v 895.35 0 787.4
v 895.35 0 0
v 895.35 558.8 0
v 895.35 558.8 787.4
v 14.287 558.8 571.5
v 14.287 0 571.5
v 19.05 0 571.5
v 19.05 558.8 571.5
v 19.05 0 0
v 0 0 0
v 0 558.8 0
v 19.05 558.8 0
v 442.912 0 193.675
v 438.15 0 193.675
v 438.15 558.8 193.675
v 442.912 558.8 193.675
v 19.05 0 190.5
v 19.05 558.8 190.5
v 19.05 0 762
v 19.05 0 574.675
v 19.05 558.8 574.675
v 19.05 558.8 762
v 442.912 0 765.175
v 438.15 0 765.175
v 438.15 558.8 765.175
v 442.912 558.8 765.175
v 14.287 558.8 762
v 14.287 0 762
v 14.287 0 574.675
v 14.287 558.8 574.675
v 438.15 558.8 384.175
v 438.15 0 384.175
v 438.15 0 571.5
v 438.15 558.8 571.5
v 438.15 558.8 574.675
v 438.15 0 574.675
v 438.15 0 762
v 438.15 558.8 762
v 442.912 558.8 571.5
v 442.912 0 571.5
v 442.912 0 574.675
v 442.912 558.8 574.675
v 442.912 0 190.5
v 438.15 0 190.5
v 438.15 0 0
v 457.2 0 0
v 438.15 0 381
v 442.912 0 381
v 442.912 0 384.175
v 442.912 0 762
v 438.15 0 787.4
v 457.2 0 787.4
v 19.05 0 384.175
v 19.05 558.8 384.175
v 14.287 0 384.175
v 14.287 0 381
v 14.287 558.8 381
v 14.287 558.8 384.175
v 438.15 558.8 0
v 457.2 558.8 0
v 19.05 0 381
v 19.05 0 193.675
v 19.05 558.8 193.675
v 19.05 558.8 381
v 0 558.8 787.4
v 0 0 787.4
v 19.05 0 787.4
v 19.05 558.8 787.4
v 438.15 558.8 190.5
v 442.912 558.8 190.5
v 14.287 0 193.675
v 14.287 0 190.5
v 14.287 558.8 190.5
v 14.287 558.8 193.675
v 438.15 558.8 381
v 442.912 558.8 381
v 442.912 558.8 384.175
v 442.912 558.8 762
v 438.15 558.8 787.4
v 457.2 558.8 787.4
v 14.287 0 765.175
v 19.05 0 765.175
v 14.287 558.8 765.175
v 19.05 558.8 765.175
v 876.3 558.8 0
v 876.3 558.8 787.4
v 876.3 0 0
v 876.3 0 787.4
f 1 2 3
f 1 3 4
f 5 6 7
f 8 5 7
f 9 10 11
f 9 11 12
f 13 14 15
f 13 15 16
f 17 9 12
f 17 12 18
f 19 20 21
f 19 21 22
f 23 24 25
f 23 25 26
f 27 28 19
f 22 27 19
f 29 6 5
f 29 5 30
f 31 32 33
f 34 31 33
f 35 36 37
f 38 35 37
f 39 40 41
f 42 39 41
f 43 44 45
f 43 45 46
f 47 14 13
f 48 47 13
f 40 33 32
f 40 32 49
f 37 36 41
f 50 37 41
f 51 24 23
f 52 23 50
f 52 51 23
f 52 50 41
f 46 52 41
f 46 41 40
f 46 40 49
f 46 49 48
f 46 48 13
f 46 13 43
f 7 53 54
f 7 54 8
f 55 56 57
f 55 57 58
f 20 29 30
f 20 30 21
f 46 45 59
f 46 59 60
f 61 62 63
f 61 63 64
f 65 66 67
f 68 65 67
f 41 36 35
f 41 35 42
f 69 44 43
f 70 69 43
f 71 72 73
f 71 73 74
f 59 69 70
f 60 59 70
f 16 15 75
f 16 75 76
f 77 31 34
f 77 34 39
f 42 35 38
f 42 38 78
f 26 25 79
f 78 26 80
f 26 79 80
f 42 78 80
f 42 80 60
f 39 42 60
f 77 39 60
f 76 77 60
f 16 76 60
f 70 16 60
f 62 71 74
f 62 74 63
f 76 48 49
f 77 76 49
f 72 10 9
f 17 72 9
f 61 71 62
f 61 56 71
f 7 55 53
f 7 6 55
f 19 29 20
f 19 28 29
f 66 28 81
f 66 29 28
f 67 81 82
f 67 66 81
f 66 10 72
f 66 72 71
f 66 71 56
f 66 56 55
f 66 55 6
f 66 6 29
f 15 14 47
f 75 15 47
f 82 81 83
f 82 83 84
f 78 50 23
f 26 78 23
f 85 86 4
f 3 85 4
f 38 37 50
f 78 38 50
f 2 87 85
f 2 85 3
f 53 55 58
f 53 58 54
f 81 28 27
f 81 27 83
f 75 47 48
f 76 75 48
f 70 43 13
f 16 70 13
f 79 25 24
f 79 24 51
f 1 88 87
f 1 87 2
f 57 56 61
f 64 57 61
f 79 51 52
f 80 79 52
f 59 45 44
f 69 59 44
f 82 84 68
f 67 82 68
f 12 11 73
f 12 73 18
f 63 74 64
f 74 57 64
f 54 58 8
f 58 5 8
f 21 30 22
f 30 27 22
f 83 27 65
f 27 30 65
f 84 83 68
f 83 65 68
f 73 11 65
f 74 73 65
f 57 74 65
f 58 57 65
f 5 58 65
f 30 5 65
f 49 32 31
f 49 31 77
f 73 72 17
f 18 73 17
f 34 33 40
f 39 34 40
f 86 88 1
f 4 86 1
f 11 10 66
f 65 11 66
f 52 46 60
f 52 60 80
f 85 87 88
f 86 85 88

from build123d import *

# Parameters (mm, degrees)
F0_W     = 19.05
F0_H     = 787.4
F1_DEPTH = 558.8
F2_W     = 428.625
F2_H     = 3.175
F3_DEPTH = 558.801


with BuildPart() as f1:
    # F0 (on Front) → F1 (new body)
    with BuildSketch(Plane.XZ):
        with Locations((9.525, 393.7)):
            Rectangle(F0_W, F0_H)
        with Locations((447.675, 393.7)):
            Rectangle(F0_W, F0_H)
        with Locations((885.825, 393.7)):
            Rectangle(F0_W, F0_H)
    extrude(amount=-F1_DEPTH)

    # F2 (on Front) → F3 (cut, through all)
    with BuildSketch(Plane.XZ):
        with Locations((228.6, 192.0875)):
            Rectangle(F2_W, F2_H)
        with Locations((228.6, 382.5875)):
            Rectangle(F2_W, F2_H)
        with Locations((228.6, 573.0875)):
            Rectangle(F2_W, F2_H)
        with Locations((228.6, 763.5875)):
            Rectangle(F2_W, F2_H)
    extrude(amount=-F3_DEPTH, mode=Mode.SUBTRACT)


solid = f1.part
